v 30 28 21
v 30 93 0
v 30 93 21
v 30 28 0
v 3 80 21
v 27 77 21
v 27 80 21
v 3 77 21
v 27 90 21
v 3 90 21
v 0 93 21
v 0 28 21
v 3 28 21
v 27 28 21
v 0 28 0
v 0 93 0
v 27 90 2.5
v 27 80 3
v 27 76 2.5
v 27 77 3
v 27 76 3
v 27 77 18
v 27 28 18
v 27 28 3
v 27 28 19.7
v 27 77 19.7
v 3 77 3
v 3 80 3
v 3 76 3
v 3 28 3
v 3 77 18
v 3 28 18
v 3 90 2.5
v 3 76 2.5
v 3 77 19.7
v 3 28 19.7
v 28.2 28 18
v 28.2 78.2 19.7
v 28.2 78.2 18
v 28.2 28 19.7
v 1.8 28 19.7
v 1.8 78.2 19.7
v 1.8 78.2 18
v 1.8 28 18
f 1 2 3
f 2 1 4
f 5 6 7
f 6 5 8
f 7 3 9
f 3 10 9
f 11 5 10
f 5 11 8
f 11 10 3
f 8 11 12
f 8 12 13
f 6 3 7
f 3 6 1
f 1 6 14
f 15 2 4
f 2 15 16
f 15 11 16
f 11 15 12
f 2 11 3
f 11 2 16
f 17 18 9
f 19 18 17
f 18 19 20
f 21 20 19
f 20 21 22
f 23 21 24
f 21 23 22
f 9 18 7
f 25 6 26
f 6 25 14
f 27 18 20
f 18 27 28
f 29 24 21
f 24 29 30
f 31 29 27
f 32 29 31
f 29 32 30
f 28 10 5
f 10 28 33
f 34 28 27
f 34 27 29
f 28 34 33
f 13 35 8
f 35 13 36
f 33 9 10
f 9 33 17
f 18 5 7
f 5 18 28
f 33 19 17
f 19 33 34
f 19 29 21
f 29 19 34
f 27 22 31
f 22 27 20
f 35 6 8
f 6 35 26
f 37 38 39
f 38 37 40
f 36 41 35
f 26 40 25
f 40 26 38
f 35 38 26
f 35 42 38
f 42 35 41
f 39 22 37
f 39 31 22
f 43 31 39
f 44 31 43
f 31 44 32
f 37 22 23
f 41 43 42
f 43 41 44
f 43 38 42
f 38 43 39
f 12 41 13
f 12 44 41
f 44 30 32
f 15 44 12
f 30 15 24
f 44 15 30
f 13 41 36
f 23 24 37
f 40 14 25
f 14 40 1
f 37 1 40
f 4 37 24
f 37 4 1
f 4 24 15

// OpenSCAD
glass_width = 26;
glass_height = 76;
glass_depth = 1.3;

glass_offset = 0.2;
glass_overlap = 1;

water_tank_width = 10;
water_gap_width = 1;
water_gap_depth = 0.5;

food_hole_size = 10;

depth = 15;
wall = 3;

difference(){
base();
cube([
    glass_width+wall*2-glass_overlap*2,
    glass_width+wall-glass_overlap,
    depth+wall+wall
]);
}

module base(){
    difference(){
        cube([
            glass_width+wall*2-glass_overlap*2,
            glass_height+wall*3-glass_overlap*2+water_tank_width,
            depth+wall+wall
        ]);
        
        //water tank
        translate([wall,glass_height+wall*2-glass_overlap*2,wall])
        cube([
            glass_width-glass_overlap*2,
            water_tank_width,
            depth+wall+wall
        ]);
        
        //water gap
   translate([wall,glass_height+wall-glass_overlap*2-water_gap_width,wall-water_gap_depth])
        cube([
            glass_width-glass_overlap*2,
            water_tank_width+water_gap_width+wall,
            water_gap_depth
        ]);
        
        // food hole
        #translate([
            wall-glass_overlap+glass_width/2,
            wall+glass_width/2-glass_overlap,
            wall-water_gap_depth])
        cylinder(1, food_hole_size, food_hole_size);
        
        
        translate([wall,wall,wall])
            cube([
                glass_width-glass_overlap*2,
                glass_height-glass_overlap*2,
                depth+wall+wall+1
            ]);
        
        translate([
            wall-glass_overlap-glass_offset,
            wall-glass_overlap-glass_offset,
            wall+depth])
            cube([
                glass_width+glass_offset*2,
                glass_height+glass_offset*2,
                glass_depth+glass_offset*2
            ]);
    }
}
